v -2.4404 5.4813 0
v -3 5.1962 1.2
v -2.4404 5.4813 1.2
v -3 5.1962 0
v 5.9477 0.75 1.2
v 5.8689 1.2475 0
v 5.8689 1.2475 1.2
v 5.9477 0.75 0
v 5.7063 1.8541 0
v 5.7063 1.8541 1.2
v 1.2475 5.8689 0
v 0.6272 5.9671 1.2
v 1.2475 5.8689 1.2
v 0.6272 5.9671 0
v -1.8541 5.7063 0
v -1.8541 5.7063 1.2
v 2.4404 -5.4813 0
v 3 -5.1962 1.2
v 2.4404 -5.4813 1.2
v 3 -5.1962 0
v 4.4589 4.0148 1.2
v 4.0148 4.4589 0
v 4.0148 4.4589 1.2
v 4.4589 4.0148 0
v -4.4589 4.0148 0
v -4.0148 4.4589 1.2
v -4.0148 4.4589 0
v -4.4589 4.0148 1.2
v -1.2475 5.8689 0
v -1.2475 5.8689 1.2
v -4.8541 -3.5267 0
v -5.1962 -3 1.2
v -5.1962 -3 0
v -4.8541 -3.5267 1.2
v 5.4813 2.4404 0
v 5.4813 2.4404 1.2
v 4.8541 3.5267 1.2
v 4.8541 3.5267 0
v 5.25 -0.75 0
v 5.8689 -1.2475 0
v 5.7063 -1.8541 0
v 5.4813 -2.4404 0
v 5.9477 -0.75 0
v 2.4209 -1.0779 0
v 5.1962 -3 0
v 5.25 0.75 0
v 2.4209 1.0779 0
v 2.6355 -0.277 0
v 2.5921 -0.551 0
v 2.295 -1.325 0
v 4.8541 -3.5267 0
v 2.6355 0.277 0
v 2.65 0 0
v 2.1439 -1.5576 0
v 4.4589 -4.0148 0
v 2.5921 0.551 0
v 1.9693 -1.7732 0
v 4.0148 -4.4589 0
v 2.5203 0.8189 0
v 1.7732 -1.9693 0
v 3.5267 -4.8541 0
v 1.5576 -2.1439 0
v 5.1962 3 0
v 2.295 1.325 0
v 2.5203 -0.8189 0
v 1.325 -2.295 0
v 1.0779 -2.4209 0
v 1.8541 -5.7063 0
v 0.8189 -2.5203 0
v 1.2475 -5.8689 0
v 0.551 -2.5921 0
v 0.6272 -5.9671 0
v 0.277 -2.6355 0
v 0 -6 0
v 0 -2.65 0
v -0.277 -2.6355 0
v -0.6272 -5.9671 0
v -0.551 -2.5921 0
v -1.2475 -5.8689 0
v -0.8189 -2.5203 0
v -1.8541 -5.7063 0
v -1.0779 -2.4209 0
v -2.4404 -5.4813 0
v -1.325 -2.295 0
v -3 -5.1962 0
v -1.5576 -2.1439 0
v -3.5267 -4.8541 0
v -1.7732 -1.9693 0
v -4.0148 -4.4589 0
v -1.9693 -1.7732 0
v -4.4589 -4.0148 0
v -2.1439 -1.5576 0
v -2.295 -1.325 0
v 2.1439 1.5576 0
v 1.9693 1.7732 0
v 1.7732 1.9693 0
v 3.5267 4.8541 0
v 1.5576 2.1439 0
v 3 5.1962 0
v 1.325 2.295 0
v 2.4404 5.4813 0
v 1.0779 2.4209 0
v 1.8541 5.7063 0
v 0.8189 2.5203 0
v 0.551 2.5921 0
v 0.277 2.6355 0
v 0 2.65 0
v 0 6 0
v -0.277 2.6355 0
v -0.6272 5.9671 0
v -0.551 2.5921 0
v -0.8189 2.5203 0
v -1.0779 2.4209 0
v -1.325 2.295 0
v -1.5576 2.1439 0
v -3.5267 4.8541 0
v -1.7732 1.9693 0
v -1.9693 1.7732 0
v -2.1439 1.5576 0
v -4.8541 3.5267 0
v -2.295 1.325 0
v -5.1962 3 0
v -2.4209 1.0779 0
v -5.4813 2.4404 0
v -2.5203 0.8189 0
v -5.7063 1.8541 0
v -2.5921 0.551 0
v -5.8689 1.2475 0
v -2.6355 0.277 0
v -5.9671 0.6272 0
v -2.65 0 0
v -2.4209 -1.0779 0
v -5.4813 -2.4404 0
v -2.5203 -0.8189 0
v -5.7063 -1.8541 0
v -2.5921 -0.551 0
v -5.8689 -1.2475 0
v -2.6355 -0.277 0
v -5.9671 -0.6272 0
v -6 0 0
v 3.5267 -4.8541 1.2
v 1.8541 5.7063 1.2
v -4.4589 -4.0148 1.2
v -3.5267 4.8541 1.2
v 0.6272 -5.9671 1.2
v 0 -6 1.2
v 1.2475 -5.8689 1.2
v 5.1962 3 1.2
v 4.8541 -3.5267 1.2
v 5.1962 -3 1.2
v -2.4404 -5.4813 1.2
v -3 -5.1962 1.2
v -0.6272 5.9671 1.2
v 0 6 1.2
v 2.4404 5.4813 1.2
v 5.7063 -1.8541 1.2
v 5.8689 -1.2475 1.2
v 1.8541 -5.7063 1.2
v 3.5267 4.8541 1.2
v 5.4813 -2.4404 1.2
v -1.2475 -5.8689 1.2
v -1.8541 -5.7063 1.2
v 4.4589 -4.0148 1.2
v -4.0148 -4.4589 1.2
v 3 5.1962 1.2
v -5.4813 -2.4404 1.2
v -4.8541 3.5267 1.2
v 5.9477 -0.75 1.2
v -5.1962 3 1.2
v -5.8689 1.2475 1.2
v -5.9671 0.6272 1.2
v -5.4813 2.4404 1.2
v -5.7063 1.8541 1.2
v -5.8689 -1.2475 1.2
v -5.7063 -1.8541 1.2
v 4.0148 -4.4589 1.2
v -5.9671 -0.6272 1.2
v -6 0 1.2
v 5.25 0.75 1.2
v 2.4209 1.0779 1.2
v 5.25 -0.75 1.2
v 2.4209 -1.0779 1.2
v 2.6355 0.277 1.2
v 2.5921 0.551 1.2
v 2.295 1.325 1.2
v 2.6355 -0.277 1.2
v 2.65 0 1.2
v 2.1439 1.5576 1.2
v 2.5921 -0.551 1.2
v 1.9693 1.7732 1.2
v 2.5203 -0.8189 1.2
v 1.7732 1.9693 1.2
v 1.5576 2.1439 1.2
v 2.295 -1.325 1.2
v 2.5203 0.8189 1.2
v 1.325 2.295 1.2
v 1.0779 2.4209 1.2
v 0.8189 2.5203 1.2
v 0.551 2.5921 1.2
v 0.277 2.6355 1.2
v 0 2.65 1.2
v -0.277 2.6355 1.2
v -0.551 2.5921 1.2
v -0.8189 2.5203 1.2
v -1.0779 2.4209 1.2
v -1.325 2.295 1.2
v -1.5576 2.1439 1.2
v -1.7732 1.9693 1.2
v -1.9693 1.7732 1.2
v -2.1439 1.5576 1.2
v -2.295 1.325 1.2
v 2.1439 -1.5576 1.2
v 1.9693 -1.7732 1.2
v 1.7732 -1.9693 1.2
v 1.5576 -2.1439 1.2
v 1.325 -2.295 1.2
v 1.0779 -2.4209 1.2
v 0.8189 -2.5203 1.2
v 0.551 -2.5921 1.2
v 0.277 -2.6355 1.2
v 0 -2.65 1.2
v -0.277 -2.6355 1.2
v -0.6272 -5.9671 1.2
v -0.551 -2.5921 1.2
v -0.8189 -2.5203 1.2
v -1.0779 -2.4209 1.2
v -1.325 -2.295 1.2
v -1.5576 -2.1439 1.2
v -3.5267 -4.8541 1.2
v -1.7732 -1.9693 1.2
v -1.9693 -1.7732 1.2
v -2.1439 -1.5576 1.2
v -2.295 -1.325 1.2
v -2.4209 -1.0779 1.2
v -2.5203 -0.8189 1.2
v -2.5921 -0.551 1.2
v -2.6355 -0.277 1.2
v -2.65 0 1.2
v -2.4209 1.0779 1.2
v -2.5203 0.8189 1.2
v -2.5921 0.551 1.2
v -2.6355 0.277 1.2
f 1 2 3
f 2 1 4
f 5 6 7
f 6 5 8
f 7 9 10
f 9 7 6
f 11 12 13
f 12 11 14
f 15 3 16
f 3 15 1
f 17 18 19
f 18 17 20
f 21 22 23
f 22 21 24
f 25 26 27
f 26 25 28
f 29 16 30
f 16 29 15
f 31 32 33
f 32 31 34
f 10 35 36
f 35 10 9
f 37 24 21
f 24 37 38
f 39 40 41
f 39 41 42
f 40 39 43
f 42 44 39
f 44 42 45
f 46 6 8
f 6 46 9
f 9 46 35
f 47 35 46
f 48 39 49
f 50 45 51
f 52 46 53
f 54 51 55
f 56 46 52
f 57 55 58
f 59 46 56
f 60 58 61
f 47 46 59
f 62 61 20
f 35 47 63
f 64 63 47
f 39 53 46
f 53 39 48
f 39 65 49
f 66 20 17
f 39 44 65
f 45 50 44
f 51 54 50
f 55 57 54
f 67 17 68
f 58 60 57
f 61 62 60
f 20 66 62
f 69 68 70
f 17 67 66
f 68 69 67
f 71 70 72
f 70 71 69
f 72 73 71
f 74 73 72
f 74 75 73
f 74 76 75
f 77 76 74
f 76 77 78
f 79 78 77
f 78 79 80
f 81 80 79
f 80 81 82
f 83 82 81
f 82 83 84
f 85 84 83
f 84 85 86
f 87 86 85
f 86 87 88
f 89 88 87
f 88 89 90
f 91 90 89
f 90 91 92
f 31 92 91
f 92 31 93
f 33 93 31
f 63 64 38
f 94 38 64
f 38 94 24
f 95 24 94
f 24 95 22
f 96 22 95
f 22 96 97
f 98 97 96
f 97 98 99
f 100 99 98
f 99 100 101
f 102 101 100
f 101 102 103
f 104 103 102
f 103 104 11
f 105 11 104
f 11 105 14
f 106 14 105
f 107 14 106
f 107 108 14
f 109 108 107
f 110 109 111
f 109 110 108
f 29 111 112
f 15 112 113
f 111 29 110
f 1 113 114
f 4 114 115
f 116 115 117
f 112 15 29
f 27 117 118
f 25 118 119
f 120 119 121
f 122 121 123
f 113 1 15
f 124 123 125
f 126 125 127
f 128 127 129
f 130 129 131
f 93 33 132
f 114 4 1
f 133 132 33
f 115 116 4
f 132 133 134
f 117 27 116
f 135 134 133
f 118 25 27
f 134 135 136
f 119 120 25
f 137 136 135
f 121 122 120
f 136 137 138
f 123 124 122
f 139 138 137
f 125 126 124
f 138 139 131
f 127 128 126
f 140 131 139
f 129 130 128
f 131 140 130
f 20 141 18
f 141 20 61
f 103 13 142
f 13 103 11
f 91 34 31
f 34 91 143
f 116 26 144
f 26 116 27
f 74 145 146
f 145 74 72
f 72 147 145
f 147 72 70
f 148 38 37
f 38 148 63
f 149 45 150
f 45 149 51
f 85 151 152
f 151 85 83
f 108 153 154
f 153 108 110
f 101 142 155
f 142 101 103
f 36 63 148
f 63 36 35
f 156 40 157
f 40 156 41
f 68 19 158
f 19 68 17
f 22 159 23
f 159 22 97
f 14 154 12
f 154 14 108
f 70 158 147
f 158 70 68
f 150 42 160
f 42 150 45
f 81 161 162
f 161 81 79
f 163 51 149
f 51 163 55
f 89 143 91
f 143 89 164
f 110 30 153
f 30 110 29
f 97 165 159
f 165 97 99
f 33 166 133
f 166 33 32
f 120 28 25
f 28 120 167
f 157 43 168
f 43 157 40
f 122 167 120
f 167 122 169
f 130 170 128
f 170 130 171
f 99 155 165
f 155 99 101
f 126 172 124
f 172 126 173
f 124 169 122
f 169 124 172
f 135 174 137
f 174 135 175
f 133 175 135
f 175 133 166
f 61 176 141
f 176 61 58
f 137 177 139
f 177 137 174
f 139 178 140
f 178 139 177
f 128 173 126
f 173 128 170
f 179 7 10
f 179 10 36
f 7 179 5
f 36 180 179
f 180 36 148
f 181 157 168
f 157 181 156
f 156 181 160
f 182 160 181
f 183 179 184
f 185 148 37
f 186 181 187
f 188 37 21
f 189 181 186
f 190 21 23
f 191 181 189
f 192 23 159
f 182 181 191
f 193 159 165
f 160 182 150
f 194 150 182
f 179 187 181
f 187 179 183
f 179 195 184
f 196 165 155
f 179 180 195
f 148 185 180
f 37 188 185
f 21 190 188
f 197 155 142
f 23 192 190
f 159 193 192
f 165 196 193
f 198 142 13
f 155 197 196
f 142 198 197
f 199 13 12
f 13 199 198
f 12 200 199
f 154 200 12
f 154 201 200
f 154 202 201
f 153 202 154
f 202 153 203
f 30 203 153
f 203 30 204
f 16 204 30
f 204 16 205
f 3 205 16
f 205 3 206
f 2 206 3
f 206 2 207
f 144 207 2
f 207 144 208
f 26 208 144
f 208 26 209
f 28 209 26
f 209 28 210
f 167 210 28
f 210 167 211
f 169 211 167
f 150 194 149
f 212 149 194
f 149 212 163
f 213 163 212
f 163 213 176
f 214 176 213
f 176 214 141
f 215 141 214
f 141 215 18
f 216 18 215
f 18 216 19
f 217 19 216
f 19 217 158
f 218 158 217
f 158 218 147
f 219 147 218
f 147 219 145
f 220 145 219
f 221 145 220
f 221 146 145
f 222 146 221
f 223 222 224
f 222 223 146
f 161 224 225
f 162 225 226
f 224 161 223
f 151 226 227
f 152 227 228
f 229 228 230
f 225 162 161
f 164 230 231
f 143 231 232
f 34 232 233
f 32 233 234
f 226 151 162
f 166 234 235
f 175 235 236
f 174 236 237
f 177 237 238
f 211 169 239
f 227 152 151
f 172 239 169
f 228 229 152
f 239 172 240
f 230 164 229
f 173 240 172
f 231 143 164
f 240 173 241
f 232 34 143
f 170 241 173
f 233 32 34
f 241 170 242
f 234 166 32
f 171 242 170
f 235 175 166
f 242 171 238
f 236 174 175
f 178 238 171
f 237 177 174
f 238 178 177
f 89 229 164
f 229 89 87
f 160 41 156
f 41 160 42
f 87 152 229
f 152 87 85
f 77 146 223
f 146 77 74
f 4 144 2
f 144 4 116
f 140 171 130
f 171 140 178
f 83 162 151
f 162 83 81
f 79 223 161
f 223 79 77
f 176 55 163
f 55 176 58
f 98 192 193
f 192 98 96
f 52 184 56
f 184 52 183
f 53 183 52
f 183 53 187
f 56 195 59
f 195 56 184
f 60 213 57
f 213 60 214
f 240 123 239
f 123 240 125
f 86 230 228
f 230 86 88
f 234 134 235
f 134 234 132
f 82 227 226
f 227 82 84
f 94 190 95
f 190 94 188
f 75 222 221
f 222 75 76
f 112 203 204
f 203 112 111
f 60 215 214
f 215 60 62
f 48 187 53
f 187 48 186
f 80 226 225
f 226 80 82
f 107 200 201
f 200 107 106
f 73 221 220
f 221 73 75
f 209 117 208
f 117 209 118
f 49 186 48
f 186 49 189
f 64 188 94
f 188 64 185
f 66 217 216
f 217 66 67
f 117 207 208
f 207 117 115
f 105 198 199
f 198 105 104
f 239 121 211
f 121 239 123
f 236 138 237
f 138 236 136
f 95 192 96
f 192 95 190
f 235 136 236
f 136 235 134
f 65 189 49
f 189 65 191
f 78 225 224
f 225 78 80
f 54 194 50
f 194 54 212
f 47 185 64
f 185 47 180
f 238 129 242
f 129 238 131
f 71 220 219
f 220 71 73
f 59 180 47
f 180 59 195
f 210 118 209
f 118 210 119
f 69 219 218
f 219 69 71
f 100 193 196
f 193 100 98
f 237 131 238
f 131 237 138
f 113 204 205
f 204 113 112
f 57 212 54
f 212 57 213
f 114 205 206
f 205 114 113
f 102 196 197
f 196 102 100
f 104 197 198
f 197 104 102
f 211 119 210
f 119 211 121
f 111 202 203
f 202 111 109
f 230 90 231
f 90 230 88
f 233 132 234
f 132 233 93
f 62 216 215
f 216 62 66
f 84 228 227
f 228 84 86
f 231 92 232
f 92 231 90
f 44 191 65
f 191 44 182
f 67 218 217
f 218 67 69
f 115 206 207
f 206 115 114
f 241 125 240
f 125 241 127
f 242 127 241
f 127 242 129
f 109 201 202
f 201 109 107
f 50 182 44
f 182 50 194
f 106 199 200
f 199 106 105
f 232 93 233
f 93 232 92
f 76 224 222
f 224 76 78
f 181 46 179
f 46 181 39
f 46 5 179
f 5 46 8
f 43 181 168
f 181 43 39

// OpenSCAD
// Split lock washer.
$fn = 60;
eps = 0.02;
inner_d = 5.3;
outer_d = 12;
thickness = 1.2;
gap = 1.5;
difference() {
    cylinder(d=outer_d,h=thickness);
    translate([0,0,-eps]) cylinder(d=inner_d,h=thickness+2*eps);
    translate([outer_d/2-gap/2,-gap/2,-eps]) cube([gap+eps,gap,thickness+2*eps]);
}
